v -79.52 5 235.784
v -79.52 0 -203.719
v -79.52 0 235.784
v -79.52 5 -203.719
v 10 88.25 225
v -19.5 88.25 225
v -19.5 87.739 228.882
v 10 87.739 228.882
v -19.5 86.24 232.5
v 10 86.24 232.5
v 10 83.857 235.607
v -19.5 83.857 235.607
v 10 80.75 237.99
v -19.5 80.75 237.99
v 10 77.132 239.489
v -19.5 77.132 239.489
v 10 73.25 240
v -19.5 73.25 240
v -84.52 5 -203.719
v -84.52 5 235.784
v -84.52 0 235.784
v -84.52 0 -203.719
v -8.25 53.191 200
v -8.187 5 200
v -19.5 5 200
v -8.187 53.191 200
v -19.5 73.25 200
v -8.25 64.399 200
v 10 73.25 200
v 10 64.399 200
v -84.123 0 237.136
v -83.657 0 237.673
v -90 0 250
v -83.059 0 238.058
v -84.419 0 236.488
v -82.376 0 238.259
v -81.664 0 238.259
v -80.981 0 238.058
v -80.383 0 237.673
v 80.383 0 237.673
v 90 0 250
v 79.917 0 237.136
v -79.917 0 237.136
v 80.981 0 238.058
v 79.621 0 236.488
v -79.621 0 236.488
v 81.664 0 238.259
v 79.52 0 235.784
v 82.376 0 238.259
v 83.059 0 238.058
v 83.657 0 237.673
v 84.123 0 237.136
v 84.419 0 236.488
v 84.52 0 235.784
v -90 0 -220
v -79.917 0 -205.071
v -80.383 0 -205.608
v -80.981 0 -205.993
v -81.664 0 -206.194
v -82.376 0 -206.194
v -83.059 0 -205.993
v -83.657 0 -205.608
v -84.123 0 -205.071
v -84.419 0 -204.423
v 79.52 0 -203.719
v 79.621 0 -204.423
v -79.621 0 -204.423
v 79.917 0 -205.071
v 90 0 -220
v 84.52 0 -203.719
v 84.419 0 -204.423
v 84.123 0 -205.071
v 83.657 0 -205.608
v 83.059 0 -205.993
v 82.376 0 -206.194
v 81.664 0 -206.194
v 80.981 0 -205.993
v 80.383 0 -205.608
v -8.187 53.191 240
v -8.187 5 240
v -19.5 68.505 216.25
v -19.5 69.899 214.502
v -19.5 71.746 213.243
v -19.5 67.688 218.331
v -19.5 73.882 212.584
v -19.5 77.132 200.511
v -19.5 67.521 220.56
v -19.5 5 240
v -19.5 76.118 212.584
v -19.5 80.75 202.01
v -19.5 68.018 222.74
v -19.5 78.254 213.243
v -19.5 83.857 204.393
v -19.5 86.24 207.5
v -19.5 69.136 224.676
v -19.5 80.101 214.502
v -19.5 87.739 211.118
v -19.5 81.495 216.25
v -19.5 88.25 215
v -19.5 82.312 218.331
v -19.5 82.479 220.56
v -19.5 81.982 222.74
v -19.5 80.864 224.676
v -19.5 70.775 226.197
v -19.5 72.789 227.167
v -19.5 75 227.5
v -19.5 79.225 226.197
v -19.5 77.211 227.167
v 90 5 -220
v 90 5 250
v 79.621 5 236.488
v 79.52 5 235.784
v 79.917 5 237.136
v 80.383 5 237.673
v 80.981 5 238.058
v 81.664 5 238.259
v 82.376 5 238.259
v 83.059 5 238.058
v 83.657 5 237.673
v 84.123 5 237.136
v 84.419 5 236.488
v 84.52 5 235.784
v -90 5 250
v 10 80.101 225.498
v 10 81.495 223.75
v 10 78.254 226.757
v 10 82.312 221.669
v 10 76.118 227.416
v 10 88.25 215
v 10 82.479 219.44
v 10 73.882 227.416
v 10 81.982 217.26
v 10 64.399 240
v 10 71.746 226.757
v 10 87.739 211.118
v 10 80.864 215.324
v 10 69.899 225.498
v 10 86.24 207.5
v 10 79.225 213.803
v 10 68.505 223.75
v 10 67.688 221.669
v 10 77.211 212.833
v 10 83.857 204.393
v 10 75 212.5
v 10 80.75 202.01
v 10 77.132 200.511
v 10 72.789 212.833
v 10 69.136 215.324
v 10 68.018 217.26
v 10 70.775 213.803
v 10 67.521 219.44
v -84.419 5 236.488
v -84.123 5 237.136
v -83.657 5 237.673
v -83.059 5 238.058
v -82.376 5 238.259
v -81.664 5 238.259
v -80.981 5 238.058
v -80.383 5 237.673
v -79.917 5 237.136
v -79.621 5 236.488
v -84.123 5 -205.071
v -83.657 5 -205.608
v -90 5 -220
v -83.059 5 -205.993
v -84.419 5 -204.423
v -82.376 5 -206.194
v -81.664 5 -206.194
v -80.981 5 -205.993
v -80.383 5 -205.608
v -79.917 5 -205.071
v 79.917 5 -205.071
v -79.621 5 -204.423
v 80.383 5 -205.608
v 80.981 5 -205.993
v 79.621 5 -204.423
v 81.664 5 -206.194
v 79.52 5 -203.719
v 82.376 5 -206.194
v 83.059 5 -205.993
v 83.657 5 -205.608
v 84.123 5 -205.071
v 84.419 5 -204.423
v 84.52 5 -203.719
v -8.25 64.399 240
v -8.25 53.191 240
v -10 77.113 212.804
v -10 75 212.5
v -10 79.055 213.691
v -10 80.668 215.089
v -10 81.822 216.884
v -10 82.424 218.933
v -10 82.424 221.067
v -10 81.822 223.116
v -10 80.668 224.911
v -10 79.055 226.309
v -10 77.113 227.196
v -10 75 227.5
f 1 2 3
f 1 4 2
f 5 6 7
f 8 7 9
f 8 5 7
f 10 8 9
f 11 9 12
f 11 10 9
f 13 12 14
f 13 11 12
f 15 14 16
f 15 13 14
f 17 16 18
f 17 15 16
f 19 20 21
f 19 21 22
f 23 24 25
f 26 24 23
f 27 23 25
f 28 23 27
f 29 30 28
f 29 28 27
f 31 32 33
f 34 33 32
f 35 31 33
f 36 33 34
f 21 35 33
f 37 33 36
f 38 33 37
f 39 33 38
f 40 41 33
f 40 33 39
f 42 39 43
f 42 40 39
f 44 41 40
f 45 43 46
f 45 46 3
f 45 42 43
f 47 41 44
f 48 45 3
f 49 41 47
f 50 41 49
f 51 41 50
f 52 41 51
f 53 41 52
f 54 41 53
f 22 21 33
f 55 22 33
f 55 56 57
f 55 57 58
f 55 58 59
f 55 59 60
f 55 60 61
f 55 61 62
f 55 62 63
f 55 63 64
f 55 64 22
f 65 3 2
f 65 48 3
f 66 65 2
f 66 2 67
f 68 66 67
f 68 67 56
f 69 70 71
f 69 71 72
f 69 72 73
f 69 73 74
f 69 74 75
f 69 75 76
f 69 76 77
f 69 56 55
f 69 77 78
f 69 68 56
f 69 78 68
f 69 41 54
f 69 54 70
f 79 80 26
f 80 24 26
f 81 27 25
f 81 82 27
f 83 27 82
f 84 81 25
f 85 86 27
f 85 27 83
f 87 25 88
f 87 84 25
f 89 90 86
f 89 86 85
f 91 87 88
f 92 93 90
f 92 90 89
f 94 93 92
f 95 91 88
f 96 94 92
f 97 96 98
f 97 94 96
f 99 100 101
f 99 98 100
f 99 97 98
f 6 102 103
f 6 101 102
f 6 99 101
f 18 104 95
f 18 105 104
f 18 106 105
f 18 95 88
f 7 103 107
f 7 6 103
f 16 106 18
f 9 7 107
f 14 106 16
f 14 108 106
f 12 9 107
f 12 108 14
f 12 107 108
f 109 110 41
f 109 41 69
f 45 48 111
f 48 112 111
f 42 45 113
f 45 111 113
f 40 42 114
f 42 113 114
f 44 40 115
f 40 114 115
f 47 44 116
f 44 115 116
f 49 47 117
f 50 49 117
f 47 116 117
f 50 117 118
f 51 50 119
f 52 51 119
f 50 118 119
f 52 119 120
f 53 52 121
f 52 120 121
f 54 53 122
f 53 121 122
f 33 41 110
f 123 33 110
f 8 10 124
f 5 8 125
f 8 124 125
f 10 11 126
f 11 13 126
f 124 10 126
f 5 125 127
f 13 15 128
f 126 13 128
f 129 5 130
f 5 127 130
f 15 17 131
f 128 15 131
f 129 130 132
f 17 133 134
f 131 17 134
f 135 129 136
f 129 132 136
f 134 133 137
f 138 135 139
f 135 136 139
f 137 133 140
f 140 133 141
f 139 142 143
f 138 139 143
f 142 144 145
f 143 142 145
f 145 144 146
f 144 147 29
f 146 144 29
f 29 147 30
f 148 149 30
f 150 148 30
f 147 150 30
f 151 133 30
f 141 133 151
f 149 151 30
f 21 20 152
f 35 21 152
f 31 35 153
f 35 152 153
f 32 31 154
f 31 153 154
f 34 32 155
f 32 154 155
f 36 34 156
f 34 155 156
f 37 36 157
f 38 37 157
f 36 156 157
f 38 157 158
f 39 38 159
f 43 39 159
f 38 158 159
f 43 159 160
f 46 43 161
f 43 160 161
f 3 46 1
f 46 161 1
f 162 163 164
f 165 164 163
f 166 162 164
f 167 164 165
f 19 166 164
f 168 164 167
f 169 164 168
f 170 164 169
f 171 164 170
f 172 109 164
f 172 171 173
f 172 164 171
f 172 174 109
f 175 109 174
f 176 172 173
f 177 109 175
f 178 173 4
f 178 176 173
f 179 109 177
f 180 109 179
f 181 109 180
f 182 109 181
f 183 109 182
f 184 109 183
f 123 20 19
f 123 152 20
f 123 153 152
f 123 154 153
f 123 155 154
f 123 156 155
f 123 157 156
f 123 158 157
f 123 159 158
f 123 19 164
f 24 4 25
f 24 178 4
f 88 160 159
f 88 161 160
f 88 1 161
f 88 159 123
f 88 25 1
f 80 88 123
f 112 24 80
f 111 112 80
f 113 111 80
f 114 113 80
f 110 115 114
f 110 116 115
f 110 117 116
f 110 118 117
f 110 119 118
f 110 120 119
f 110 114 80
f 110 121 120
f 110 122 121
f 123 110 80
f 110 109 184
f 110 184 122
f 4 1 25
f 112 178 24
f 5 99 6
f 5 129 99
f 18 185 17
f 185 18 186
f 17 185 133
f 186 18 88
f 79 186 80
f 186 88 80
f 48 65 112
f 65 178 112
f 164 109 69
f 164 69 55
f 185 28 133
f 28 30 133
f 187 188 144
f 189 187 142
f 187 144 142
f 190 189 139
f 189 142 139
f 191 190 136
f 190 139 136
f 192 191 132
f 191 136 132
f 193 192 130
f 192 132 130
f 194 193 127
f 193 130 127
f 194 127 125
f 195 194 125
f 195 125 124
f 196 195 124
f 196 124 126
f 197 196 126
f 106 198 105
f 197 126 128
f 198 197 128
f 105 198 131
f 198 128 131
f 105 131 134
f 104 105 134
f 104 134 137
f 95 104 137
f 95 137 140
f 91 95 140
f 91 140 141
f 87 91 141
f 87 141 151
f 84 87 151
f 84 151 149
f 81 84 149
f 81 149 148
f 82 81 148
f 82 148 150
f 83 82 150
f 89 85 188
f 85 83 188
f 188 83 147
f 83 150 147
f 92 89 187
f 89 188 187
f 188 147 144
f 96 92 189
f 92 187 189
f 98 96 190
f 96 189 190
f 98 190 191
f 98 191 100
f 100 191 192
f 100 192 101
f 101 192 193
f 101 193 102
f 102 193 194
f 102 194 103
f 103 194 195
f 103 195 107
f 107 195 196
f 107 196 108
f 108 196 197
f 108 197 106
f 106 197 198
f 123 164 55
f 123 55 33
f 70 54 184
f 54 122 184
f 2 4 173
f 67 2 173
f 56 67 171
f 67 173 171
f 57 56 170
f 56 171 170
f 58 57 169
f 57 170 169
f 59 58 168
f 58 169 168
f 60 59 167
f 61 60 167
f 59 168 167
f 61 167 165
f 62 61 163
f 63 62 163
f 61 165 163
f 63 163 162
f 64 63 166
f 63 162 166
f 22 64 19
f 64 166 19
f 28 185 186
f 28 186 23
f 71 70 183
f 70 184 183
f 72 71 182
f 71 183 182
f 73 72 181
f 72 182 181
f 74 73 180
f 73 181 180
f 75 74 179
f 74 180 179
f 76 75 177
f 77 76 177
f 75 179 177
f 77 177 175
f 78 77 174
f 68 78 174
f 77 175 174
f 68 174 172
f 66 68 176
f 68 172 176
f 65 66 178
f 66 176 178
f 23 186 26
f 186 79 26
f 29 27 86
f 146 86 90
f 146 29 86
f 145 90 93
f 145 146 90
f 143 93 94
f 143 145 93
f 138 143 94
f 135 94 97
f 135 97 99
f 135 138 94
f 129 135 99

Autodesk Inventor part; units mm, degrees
ref_plane "YZ Plane" through (0, 0, 0) normal (1, 0, 0) x (0, 1, 0)
ref_plane "XZ Plane" through (0, 0, 0) normal (0, 1, 0) x (-1, 0, 0)
ref_plane "XY Plane" through (0, 0, 0) normal (0, 0, 1) x (1, 0, 0)
sketch "Sketch1" plane through (0, 0, 0) normal (0, 1, 0) x (-1, 0, 0)
  line L0 (80, 0) -> (80, -250)
  line L1 (80, -250) -> (-80, -250)
  line L2 (-80, -250) -> (-80, 250)
  line L3 (-80, 250) -> (80, 250)
  line L4 (80, 250) -> (80, 0)
  point P0 (0, 0)
extrude "Extrusion1" add sketch "Sketch1" along normal blind 5
sketch "Sketch2" plane through (0, 5, 0) normal (0, 1, 0) x (1, 0, 0)
  line L0 (0, 0) -> (0, -200)
  line L1 (0, -200) -> (10, -200)
  line L2 (10, -200) -> (-10, -200)
  line L3 (-10, -200) -> (-10, -240)
  line L4 (-10, -240) -> (10, -240)
  line L5 (10, -240) -> (10, -200)
  dimension "d7" = 200
  dimension "d8" = 10
  dimension "d9" = 20
  dimension "d10" = 40
  dimension "d11" = 20
extrude "Extrusion2" add sketch "Sketch2" along normal blind 100
sketch "Sketch3" plane through (10, 5, 240) normal (1, 0, 0) x (0, 0, -1)
  line L0 (40, 100) -> (0, 100) projected
  circle A0 centre (20, 70) radius 7.5
  point P0 (240, -5)
  dimension "d15" = 15
extrude "Extrusion3" cut sketch "Sketch3" against normal blind 100
sketch "Sketch4" plane through (80, 0, 250) normal (1, 0, 0) x (0, 0, -1)
  line L0 (0, 0) -> (0, 5) projected
  line L1 (0, 0) -> (500, 0) projected
  line L2 (0, 5) -> (500, 5)
  line L3 (500, 5) -> (500, 0)
  line L4 (500, 0) -> (0, 0)
  line L5 (0, 0) -> (0, 5)
  point P0 (250, 0)
extrude "Extrusion4" add sketch "Sketch4" along normal blind 10
sketch "Sketch5" plane through (-80, 0, -250) normal (-1, 0, 0) x (0, 0, 1)
  line L0 (0, 5) -> (500, 5) projected
  line L1 (500, 0) -> (500, 5) projected
  line L2 (0, 5) -> (500, 5)
  line L3 (500, 5) -> (500, 0)
  line L4 (500, 0) -> (0, 0)
  line L5 (0, 0) -> (0, 5)
  point P0 (250, 0)
extrude "Extrusion5" add sketch "Sketch5" along normal blind 10
sketch "Sketch6" plane through (90, 0, -250) normal (0, 0, -1) x (-1, 0, 0)
  line L0 (0, 5) -> (180, 5) projected
  line L1 (180, 0) -> (0, 0) projected
  line L2 (0, 5) -> (180, 5)
  line L3 (180, 5) -> (180, 0)
  line L4 (180, 0) -> (0, 0)
  line L5 (0, 0) -> (0, 5)
  point P0 (90, 0)
extrude "Extrusion6" cut sketch "Sketch6" against normal blind 30
sketch "Sketch7" plane through (0, 5, 0) normal (0, 1, 0) x (1, 0, 0)
  line L0 (-90, -250) -> (90, -250) projected
  arc A0 (79.52, -235.7841) -> (84.52, -235.7841) centre (82.02, -235.7841) ccw
  arc A1 (84.52, 203.719) -> (79.52, 203.719) centre (82.02, 203.719) ccw
  line L1 (79.52, 203.719) -> (79.52, -235.7841)
  line L2 (84.52, -235.7841) -> (84.52, 203.719)
  line L3 (-90, -250) -> (-90, 220) projected
  line L4 (90, 220) -> (-90, 220) projected
  arc A2 (-79.52, 203.719) -> (-84.52, 203.719) centre (-82.02, 203.719) ccw
  arc A3 (-84.52, -235.7841) -> (-79.52, -235.7841) centre (-82.02, -235.7841) ccw
  line L5 (-84.52, -235.7841) -> (-84.52, 203.719)
  line L6 (-79.52, 203.719) -> (-79.52, -235.7841)
  point P0 (0, 0)
  dimension "d25" = 5
  dimension "d26" = 5
  dimension "d28" = 5
  dimension "d29" = 5
extrude "Extrusion7" cut sketch "Sketch7" against normal blind 30
sketch "Sketch8" plane through (10, 5, 240) normal (1, 0, 0) x (0, 0, -1)
  point P0 (240, -5)
sketch "Sketch9" plane through (0, 105, 0) normal (0, 1, 0) x (1, 0, 0)
  line L0 (10, -240) -> (-10, -240) projected
  line L1 (-10, -200) -> (10, -200) projected
  line L2 (-10, -240) -> (10, -240)
  line L3 (10, -240) -> (10, -200)
  line L4 (10, -200) -> (-10, -200)
  line L5 (-10, -200) -> (-10, -240)
  point P0 (0, 0)
extrude "Extrusion8" cut sketch "Sketch9" against normal blind 16.75
sketch "Sketch10" plane through (-10, 5, 200) normal (-1, 0, 0) x (0, 0, 1)
  line L0 (0, 0) -> (0, 83.25) projected
  line L1 (40, 0) -> (40, 83.25) projected
  line L2 (0, 83.25) -> (40, 83.25)
  line L3 (40, 83.25) -> (40, 0)
  line L4 (40, 0) -> (0, 0)
  line L5 (0, 0) -> (0, 83.25)
  circle A0 centre (20, 70) radius 7.5 projected
  circle A1 centre (20, 70) radius 7.5
  point P0 (-200, -5)
extrude "Extrusion9" add sketch "Sketch10" along normal blind 9.5
sketch "Sketch11" plane through (10, 5, 200) normal (0, 0, -1) x (-1, 0, 0)
  line L0 (0, 0) -> (0, 83.25) projected
  line L1 (0, 0) -> (18.187, 0)
  line L2 (18.187, 0) -> (18.187, 48.2097)
  line L3 (18.187, 48.2097) -> (0, 48.2097)
  line L4 (0, 48.2097) -> (0, 0)
  point P0 (10, -5)
extrude "Extrusion10" cut sketch "Sketch11" against normal blind 66.75
sketch "Sketch12" plane through (10, 88.25, 240) normal (1, 0, 0) x (0, 0, -1)
  line L0 (0, -83.25) -> (0, 0) projected
  line L1 (40, 0) -> (40, -83.25) projected
  line L2 (0, -35.059) -> (40, -35.059)
  line L3 (40, -35.059) -> (40, -23.8514)
  line L4 (40, -23.8514) -> (0, -23.8514)
  line L5 (0, -23.8514) -> (0, -35.059)
  point P0 (240, -88.25)
extrude "Extrusion11" cut sketch "Sketch12" against normal blind 18.25
fillet "Fillet1" radius 15 2 edges at (-4.75, 88.25, 240) (-4.75, 88.25, 200)
equation "\"BendRadius\" = Thickness"
equation "\"BendReliefWidth\" = Thickness"
equation "\"BendReliefDepth\" = 0.5 * Thickness"
equation "\"CornerReliefSize\" = 4 * Thickness"
equation "\"MinimumRemnant\" = 2 * Thickness"
equation "\"TransitionRadius\" = BendRadius"
equation "\"JacobiRadiusSize\" = BendRadius"
equation "\"GapSize\" = Thickness"
equation "\"Thickness\" = 0.5"
